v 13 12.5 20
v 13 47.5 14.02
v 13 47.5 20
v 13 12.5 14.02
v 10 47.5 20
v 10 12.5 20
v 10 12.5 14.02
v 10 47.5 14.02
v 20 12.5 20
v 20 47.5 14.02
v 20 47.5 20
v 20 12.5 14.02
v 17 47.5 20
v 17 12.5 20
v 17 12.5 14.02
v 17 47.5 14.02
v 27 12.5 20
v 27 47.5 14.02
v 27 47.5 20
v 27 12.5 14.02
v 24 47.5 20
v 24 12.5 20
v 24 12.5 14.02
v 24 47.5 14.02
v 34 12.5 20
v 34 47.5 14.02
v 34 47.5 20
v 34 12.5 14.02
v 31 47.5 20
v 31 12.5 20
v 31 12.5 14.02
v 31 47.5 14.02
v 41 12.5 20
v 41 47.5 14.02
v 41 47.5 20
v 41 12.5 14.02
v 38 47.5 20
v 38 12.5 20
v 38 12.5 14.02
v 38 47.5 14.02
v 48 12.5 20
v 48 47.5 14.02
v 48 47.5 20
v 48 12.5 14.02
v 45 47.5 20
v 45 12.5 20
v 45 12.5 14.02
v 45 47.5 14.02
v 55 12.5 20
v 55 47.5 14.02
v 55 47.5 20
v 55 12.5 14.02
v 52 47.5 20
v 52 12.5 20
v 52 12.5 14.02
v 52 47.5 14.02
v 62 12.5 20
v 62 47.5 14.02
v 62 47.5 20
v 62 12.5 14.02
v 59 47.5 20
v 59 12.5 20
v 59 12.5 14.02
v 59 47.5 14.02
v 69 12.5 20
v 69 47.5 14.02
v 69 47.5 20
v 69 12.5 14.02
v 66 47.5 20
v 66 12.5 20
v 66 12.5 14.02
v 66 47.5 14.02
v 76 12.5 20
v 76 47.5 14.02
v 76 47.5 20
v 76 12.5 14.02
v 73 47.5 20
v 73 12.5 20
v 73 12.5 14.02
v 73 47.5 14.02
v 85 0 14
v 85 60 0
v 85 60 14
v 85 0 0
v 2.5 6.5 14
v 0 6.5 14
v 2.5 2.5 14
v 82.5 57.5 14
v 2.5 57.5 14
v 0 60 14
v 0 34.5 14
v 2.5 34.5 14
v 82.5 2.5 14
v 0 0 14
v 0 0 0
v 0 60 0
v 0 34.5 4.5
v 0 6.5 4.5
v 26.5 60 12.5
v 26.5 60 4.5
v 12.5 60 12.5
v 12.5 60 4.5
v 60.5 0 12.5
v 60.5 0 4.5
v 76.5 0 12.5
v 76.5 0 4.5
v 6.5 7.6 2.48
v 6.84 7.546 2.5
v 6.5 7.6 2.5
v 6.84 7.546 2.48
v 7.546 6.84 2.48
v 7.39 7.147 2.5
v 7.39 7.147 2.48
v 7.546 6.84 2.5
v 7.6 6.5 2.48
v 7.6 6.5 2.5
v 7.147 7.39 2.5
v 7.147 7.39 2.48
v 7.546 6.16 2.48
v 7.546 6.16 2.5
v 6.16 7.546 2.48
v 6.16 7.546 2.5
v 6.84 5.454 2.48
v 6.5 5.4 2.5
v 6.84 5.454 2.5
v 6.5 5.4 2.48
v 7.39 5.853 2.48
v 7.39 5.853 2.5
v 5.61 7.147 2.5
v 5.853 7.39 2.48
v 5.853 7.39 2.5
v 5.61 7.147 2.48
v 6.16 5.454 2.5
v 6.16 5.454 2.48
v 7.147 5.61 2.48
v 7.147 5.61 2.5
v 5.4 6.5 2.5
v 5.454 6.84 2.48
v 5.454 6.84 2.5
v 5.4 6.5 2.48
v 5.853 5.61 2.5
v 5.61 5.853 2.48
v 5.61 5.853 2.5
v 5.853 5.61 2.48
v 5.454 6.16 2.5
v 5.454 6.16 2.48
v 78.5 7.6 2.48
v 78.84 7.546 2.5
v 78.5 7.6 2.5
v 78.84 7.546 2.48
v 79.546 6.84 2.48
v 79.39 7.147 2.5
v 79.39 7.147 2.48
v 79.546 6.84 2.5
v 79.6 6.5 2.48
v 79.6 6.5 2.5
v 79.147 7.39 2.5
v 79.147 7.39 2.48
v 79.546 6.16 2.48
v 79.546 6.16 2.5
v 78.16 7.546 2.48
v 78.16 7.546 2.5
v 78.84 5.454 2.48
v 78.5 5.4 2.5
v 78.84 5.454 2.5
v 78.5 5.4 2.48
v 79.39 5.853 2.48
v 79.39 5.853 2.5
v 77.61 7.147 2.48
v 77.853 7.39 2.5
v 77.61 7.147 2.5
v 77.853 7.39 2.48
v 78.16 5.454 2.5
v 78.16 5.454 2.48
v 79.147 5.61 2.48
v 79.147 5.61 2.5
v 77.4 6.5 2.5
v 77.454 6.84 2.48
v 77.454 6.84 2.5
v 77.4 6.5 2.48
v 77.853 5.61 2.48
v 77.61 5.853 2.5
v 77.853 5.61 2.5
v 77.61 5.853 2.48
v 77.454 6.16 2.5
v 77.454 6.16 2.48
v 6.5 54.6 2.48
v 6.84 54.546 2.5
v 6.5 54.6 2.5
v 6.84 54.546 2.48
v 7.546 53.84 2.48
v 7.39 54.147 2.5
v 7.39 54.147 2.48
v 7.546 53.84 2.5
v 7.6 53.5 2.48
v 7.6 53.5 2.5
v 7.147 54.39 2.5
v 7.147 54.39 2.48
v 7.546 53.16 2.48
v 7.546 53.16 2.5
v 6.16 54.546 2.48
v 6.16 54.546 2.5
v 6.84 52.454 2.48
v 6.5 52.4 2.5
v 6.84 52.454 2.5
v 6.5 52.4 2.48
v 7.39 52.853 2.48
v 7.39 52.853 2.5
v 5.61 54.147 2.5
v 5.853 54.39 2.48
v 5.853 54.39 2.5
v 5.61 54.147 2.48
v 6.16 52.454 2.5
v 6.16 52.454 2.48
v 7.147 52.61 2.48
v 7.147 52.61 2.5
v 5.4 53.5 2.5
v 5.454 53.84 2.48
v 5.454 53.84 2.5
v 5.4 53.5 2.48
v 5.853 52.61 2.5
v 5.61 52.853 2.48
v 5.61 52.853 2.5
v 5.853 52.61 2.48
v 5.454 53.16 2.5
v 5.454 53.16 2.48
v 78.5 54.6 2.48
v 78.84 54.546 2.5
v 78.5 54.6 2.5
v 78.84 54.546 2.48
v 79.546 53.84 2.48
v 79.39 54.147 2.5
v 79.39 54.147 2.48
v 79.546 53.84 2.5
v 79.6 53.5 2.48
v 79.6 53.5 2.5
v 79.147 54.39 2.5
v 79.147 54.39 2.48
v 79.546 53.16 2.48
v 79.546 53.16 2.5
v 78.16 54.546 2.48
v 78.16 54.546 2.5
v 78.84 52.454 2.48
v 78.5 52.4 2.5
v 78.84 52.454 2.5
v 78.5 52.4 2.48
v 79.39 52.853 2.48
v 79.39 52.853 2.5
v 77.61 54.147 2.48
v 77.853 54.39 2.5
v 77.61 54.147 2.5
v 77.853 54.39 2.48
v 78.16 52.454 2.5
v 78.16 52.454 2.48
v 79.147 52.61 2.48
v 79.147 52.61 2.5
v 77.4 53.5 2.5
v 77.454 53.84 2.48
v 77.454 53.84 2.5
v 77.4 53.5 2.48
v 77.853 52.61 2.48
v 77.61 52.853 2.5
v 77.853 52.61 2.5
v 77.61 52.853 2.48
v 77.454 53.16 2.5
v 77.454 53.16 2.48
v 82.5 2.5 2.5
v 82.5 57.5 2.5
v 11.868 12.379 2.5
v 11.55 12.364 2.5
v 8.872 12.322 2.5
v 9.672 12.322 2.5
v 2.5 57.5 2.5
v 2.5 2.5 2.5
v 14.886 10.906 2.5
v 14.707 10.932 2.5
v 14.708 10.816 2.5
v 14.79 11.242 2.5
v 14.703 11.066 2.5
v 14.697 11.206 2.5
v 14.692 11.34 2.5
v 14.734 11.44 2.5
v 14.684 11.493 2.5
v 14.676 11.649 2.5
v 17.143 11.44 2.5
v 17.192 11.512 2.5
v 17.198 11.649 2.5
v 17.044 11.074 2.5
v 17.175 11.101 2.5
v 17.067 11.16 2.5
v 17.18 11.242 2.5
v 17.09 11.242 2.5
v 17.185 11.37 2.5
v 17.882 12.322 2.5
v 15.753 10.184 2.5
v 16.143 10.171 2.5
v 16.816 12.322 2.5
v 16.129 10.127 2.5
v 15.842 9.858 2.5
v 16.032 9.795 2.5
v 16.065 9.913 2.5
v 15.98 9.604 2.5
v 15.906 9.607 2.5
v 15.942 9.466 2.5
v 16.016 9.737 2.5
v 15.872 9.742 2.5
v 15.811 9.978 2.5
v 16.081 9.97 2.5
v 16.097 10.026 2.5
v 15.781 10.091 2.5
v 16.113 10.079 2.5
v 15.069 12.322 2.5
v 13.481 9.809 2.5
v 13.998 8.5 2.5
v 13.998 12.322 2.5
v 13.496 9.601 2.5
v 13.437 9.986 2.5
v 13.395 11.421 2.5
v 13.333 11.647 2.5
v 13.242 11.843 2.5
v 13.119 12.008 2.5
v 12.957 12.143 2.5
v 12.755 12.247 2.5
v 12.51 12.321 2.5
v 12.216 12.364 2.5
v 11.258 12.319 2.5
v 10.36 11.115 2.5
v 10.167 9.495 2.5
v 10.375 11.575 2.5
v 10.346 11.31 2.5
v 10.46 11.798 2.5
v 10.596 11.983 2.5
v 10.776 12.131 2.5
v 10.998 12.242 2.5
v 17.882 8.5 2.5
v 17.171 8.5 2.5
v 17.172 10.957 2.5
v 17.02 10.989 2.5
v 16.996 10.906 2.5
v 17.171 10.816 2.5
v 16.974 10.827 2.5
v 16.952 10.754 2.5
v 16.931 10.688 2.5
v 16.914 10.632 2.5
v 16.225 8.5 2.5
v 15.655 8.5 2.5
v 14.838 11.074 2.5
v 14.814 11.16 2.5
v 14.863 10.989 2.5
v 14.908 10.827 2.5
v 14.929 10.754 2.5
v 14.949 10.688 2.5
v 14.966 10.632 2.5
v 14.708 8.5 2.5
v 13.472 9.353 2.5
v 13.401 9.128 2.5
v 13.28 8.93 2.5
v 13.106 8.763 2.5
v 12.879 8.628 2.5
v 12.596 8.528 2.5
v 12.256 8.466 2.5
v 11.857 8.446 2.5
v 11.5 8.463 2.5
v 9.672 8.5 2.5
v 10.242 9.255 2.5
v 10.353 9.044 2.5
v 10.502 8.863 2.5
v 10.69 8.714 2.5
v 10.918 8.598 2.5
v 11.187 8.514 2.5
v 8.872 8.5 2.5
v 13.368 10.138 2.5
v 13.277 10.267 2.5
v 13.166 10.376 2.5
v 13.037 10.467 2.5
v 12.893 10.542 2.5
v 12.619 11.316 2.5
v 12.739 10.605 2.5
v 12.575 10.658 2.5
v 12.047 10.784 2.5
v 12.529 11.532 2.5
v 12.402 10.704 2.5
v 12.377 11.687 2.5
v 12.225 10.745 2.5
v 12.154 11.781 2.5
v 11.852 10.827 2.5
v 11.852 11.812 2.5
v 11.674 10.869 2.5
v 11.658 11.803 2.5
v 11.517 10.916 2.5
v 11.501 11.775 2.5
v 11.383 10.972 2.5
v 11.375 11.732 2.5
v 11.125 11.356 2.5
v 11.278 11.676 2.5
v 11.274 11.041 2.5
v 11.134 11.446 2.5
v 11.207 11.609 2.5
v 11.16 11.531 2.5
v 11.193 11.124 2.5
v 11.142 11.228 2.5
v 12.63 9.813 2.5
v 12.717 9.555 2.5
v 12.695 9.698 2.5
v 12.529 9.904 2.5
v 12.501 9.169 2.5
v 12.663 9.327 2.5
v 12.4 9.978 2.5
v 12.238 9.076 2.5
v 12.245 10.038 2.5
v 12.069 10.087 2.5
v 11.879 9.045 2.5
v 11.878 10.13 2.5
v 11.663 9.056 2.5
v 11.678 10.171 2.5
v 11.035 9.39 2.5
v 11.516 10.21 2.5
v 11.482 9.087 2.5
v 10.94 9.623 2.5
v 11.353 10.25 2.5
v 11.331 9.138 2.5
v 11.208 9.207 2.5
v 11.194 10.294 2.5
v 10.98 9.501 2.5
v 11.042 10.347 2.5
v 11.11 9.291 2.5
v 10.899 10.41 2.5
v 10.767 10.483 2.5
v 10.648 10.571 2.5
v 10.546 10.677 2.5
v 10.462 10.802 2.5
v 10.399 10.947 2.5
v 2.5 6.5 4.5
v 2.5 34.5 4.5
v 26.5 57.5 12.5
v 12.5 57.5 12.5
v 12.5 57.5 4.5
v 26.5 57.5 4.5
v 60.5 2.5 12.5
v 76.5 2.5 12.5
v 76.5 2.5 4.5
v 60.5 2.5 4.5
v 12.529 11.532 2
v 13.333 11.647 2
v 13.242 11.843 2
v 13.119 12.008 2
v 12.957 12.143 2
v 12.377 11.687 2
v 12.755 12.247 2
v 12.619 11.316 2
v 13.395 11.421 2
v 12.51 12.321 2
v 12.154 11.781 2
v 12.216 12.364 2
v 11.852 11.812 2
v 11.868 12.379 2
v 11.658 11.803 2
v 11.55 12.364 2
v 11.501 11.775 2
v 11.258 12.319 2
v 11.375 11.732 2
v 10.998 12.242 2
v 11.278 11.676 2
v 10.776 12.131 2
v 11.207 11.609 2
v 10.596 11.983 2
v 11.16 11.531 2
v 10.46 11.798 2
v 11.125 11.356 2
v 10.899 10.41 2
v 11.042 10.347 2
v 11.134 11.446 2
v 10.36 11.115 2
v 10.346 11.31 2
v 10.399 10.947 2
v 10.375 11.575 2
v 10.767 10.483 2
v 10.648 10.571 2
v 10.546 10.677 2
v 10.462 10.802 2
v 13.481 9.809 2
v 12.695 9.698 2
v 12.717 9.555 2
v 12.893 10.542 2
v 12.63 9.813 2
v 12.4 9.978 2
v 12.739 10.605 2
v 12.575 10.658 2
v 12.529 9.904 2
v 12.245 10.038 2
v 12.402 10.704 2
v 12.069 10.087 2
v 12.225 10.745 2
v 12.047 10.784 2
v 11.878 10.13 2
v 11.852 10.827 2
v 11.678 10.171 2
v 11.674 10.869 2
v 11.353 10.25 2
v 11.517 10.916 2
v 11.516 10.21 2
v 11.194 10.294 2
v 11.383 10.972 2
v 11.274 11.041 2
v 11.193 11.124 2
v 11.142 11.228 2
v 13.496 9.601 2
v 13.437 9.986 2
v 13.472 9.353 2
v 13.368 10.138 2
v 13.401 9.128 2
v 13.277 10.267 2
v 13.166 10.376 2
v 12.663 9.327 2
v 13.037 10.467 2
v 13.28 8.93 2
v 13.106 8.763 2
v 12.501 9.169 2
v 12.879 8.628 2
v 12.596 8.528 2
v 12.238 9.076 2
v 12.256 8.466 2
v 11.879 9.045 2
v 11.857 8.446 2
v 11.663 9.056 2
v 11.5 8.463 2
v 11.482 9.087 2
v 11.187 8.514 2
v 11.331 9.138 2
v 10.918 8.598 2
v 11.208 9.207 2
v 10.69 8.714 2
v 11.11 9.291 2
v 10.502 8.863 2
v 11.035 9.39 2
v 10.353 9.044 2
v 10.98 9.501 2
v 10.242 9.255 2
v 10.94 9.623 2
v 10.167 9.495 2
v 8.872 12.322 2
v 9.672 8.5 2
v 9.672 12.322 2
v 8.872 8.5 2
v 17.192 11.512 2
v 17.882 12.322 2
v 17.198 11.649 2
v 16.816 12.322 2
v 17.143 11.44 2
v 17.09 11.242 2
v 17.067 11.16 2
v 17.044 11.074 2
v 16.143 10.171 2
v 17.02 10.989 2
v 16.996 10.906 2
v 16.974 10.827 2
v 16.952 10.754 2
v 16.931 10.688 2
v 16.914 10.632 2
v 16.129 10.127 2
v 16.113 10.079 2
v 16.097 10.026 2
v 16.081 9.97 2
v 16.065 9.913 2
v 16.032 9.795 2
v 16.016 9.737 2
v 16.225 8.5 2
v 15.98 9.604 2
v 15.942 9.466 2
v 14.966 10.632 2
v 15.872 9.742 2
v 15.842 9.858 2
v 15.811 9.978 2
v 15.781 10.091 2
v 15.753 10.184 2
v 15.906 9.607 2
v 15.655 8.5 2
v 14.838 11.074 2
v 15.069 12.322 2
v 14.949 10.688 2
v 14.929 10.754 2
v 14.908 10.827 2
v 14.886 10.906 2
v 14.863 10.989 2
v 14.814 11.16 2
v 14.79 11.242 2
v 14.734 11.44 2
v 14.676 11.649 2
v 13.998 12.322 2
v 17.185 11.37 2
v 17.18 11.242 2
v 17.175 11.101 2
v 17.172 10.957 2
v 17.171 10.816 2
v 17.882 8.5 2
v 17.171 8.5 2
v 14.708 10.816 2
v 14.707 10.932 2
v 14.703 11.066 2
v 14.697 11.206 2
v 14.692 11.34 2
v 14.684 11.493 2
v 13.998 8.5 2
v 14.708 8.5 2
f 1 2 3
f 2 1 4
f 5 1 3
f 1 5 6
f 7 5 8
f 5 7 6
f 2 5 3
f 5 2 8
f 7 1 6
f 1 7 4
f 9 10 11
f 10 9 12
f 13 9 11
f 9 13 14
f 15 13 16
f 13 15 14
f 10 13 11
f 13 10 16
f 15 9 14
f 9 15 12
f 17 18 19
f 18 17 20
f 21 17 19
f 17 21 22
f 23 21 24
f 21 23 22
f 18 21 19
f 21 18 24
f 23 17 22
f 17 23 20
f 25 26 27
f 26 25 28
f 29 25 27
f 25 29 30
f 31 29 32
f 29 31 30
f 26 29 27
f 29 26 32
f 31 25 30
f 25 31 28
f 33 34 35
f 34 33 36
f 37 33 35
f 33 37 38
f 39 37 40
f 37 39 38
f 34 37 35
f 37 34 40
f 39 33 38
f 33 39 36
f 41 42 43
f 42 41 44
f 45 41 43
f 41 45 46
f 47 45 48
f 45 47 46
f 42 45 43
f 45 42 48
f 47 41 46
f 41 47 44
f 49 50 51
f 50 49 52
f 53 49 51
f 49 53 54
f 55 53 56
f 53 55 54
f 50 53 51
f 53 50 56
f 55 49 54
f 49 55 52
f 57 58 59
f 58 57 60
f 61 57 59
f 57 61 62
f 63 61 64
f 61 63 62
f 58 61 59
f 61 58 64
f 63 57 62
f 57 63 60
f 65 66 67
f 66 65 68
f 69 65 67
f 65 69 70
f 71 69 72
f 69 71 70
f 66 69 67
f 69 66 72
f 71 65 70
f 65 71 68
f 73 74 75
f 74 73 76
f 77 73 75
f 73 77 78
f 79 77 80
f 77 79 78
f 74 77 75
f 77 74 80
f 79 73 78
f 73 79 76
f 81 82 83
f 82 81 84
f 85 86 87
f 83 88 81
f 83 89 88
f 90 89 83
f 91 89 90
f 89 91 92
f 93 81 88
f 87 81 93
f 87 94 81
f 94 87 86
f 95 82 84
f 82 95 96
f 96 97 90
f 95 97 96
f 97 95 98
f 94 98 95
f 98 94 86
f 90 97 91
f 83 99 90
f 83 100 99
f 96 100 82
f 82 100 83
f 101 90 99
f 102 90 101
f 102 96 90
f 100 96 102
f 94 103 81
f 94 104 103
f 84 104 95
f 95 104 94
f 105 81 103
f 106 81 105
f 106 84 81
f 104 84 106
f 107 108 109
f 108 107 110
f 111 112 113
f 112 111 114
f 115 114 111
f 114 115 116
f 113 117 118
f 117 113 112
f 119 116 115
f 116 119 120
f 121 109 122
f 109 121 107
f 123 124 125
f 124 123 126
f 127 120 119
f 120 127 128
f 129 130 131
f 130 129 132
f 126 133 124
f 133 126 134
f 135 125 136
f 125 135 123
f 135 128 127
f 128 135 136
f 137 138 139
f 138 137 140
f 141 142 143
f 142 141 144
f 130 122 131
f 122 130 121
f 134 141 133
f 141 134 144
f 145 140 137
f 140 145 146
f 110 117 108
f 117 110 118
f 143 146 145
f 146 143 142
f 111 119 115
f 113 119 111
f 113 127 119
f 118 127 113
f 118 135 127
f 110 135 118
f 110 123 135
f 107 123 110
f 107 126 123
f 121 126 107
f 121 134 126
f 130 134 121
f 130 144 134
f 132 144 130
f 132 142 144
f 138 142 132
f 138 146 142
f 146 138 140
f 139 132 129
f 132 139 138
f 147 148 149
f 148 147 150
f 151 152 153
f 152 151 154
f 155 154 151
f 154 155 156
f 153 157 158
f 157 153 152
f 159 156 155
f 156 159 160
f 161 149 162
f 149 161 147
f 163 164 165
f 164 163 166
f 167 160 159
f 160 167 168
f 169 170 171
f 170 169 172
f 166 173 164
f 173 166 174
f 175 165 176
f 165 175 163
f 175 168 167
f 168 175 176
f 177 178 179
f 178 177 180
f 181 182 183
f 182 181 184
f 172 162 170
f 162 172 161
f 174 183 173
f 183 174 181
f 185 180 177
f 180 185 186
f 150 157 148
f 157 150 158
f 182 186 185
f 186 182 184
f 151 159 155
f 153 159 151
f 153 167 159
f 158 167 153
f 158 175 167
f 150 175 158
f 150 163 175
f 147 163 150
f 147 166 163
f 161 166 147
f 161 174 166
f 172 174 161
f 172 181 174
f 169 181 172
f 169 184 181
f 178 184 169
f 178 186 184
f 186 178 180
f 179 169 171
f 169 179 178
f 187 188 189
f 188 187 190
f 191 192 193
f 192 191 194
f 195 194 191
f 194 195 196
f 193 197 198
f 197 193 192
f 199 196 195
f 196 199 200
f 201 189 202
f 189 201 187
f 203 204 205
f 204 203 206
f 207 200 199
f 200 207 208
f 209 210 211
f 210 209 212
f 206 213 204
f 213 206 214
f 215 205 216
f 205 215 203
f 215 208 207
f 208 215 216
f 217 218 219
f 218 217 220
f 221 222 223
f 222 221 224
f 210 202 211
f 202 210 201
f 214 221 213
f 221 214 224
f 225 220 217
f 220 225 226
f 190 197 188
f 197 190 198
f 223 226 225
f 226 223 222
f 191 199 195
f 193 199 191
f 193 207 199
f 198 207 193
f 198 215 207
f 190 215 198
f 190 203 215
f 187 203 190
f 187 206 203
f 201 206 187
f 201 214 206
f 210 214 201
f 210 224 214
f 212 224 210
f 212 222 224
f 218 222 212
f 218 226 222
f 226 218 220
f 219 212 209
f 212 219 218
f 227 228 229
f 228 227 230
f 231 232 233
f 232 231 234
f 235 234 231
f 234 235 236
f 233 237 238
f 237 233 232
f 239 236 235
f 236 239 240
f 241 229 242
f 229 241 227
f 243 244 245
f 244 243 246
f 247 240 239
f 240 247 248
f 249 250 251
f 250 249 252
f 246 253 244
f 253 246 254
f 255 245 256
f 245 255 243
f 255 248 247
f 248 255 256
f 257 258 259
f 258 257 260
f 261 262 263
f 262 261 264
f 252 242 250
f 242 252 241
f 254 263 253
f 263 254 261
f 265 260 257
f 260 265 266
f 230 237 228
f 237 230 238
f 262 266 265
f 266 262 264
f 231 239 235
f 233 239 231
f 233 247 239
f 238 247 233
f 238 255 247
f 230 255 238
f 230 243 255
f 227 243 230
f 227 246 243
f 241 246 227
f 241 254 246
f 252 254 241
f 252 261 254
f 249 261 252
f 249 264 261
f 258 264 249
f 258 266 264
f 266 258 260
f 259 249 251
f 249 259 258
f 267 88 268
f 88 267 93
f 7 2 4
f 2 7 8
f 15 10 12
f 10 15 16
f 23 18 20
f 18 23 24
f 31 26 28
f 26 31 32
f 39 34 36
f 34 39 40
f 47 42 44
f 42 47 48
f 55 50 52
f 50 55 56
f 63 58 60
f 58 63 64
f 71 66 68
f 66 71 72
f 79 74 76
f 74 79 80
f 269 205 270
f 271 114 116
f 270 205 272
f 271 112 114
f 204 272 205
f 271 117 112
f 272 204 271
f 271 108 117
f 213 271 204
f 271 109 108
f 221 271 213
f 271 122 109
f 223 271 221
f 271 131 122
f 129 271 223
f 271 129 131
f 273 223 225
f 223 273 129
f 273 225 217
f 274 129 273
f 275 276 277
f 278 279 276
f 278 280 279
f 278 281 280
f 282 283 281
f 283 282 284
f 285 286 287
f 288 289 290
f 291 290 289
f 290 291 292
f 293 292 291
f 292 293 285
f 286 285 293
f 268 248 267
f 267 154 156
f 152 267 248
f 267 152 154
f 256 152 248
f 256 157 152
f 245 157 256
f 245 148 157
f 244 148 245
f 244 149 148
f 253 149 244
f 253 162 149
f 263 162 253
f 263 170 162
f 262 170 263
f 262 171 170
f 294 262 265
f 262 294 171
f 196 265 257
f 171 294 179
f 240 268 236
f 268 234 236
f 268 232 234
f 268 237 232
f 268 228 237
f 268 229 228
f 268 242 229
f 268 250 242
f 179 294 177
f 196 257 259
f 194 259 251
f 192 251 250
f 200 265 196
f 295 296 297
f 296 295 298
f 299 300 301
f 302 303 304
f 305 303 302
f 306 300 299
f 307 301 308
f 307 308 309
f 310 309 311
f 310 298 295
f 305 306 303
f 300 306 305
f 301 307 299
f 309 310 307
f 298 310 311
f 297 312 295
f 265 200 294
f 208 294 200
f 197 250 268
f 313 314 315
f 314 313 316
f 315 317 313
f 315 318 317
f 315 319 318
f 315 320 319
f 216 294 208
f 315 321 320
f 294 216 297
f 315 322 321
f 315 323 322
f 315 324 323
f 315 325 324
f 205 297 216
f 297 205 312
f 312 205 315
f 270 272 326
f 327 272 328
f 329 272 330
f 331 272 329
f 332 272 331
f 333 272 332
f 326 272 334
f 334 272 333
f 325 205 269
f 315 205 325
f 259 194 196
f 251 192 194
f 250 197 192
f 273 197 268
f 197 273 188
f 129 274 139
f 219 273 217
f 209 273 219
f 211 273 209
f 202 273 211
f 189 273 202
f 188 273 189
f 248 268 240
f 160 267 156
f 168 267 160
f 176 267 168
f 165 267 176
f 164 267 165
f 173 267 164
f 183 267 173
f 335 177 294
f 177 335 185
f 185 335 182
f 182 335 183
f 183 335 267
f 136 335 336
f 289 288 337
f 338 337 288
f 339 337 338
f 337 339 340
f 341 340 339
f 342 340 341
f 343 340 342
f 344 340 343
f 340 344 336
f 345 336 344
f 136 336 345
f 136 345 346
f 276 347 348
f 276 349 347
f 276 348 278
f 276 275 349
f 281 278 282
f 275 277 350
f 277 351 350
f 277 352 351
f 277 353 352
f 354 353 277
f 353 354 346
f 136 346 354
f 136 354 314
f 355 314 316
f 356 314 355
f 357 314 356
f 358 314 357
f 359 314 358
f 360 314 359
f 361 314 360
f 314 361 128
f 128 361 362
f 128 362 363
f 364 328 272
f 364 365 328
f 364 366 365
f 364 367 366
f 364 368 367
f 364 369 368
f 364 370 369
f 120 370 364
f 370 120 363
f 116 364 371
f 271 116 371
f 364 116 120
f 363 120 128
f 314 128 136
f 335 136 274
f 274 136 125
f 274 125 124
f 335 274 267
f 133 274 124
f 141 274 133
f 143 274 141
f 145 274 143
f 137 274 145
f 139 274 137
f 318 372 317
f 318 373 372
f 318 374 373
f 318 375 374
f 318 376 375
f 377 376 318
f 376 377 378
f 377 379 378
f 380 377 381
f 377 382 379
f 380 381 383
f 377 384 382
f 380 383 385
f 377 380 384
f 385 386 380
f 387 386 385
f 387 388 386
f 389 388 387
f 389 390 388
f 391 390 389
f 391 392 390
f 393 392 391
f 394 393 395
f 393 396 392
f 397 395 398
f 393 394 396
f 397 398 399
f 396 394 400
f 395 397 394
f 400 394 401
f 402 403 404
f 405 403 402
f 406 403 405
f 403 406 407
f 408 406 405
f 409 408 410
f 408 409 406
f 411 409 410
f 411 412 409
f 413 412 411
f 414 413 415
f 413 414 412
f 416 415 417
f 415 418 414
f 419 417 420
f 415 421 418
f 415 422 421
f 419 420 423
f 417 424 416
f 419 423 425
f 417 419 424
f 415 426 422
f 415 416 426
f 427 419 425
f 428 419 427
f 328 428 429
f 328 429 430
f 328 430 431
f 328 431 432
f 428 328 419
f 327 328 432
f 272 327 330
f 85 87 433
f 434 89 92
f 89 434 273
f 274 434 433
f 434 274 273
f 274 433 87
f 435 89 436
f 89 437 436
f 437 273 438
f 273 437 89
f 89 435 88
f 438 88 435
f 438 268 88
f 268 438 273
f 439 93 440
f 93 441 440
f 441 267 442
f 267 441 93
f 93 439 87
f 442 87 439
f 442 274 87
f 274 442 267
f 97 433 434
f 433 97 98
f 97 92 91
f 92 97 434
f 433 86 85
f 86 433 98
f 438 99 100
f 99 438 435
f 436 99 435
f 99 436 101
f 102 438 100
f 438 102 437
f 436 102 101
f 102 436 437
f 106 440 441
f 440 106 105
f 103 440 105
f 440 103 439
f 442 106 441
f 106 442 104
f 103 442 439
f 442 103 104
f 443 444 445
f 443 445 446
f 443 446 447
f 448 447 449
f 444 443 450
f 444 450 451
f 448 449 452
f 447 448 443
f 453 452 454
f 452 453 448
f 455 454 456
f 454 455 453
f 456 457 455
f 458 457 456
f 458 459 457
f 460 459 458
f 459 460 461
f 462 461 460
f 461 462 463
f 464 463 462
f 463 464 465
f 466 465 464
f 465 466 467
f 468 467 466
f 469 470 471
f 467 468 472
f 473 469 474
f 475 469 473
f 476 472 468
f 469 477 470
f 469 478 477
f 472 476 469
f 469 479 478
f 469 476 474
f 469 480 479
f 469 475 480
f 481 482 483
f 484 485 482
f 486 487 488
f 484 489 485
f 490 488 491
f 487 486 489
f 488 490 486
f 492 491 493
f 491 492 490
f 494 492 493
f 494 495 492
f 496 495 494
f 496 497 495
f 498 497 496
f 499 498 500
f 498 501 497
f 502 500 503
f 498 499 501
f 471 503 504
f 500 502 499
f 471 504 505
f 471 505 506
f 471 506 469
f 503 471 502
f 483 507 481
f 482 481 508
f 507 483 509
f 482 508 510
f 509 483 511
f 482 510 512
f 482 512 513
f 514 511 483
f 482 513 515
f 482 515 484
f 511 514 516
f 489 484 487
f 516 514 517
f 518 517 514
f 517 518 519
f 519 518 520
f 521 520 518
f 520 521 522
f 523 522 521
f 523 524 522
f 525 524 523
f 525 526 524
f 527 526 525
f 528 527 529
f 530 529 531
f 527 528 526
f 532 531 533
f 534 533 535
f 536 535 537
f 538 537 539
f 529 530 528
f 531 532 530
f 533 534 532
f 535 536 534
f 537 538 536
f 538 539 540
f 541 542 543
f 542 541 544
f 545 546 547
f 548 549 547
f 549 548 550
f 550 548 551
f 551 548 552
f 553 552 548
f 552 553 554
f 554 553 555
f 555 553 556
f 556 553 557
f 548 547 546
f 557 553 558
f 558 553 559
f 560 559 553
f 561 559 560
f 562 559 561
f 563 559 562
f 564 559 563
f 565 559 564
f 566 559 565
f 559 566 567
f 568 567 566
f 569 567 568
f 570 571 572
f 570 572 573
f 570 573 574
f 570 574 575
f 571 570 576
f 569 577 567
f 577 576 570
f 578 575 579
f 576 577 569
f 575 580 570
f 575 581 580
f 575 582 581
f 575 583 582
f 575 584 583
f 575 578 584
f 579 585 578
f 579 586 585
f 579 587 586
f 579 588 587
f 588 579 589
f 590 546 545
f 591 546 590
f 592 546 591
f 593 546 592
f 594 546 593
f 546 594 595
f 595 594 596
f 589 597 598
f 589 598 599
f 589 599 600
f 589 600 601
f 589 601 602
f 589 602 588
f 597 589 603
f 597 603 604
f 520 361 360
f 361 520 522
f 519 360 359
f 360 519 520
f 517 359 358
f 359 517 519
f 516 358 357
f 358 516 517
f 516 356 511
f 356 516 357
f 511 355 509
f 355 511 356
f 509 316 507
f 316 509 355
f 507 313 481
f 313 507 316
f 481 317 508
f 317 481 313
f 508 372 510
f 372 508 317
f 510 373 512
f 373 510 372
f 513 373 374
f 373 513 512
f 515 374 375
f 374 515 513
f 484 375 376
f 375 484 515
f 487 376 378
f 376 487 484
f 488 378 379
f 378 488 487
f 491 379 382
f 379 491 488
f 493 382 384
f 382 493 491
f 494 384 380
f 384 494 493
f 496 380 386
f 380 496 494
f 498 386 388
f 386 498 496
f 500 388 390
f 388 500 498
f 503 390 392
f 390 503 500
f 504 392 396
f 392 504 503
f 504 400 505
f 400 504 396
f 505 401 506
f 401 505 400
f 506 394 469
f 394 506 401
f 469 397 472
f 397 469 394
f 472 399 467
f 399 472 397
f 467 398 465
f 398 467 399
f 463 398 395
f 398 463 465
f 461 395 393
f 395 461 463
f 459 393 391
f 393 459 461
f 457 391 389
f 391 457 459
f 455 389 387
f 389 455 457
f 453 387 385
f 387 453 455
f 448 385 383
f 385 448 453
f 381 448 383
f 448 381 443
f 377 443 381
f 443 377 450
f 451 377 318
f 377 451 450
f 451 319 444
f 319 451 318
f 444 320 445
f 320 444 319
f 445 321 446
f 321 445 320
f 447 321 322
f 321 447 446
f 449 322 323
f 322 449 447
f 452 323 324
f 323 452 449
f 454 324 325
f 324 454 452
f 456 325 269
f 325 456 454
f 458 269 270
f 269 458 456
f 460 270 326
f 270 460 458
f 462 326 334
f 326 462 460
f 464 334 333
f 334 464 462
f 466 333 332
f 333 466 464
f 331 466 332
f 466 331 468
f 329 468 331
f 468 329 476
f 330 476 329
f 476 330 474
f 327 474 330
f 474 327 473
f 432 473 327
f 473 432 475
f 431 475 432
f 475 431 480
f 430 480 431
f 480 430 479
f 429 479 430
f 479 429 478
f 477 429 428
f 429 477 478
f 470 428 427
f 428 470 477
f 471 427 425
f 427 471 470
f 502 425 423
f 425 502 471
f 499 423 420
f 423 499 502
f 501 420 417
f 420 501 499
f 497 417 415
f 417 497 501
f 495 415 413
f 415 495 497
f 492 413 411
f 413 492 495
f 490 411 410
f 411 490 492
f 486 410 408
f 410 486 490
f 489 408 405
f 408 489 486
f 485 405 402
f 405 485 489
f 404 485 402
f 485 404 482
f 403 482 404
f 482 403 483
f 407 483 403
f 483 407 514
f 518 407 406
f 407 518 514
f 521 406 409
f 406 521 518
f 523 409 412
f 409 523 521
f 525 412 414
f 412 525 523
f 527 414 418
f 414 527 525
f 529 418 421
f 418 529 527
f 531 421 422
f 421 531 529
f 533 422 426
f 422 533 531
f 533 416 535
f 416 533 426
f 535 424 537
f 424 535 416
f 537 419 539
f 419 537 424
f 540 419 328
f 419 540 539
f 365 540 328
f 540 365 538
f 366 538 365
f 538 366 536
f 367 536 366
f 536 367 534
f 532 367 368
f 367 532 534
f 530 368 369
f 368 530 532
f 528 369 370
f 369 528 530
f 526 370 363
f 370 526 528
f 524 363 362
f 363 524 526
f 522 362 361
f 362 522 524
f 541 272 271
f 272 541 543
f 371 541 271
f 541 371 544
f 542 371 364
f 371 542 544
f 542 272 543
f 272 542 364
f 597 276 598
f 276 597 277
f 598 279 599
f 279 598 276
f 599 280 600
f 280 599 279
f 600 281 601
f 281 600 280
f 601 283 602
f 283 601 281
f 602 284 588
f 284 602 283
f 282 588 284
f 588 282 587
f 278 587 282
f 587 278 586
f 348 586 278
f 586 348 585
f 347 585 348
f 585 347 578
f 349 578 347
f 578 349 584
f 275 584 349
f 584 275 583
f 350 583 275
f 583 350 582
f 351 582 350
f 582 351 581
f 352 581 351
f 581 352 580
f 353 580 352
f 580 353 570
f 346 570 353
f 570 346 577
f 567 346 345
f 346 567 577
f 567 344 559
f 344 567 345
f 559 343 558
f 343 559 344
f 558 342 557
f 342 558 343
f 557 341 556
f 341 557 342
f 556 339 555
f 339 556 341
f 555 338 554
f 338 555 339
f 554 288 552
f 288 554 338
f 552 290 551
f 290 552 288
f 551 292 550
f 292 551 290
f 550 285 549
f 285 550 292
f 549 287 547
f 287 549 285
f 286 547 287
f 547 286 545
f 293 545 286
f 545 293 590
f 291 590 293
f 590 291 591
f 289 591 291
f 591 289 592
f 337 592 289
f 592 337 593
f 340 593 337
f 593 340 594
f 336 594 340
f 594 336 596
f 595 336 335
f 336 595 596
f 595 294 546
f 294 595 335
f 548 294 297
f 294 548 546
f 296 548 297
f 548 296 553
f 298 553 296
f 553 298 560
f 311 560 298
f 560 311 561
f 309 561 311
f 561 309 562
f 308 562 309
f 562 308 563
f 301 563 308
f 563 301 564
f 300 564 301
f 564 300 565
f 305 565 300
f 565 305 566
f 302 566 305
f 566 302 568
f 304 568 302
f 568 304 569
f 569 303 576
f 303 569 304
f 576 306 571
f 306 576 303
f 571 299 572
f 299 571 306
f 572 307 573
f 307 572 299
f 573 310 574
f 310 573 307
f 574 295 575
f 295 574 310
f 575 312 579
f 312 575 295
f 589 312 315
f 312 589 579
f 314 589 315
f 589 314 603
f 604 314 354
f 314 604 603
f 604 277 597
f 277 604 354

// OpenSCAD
// ISM Sound Card bracket + cooler shroud (original ISM)
// Manifold-safe: bosses unioned into shell, holes cut in one difference().
pcb_w = 80;
pcb_d = 55;
wall = 2.5;
shroud_h = 14;
fin_h = 6;
eps = 0.02;
mount_d = 2.2;
badge_depth = 0.5;

mounts = [[4, 4], [pcb_w - 4, 4], [4, pcb_d - 4], [pcb_w - 4, pcb_d - 4]];

module shroud() {
  difference() {
    union() {
      cube([pcb_w + 2 * wall, pcb_d + 2 * wall, shroud_h]);
      for (x = [10 : 7 : pcb_w - 6])
        translate([x, wall + 10, shroud_h - eps])
          cube([3, pcb_d - 20, fin_h + eps]);
      for (p = mounts)
        translate([p[0] + wall, p[1] + wall, wall - eps])
          cylinder(h = 5 + eps, d = 6, $fn = 24);
    }
    translate([wall, wall, wall])
      cube([pcb_w, pcb_d, shroud_h - wall + eps]);
    // EXP header clearance
    translate([-eps, wall + 4, wall + 2])
      cube([wall + 4, 28, 10]);
    // 3.5 mm jack cutout
    translate([wall + 10, wall + pcb_d - 2, wall + 2])
      cube([14, wall + 4, 8]);
    // USB-C
    translate([wall + pcb_w - 22, -eps, wall + 2])
      cube([16, wall + 4, 8]);
    for (p = mounts)
      translate([p[0] + wall, p[1] + wall, wall - eps])
        cylinder(h = 8 + 2 * eps, d = mount_d, $fn = 20);
    translate([wall + 6, wall + 6, wall - badge_depth])
      linear_extrude(height = badge_depth + eps)
        text("ISM", size = 4, font = "Liberation Sans:style=Bold");
  }
}

module slot_bracket() {
  bw = 20;
  bh = 120;
  bt = 1.2;
  difference() {
    cube([bw, bt, bh]);
    translate([4, -eps, 20])
      cube([12, bt + 2 * eps, 14]);
    for (z = [8, bh - 8])
      translate([bw / 2, -eps, z])
        rotate([-90, 0, 0])
          cylinder(h = bt + 2 * eps, d = 3.2, $fn = 20);
  }
}

shroud();
